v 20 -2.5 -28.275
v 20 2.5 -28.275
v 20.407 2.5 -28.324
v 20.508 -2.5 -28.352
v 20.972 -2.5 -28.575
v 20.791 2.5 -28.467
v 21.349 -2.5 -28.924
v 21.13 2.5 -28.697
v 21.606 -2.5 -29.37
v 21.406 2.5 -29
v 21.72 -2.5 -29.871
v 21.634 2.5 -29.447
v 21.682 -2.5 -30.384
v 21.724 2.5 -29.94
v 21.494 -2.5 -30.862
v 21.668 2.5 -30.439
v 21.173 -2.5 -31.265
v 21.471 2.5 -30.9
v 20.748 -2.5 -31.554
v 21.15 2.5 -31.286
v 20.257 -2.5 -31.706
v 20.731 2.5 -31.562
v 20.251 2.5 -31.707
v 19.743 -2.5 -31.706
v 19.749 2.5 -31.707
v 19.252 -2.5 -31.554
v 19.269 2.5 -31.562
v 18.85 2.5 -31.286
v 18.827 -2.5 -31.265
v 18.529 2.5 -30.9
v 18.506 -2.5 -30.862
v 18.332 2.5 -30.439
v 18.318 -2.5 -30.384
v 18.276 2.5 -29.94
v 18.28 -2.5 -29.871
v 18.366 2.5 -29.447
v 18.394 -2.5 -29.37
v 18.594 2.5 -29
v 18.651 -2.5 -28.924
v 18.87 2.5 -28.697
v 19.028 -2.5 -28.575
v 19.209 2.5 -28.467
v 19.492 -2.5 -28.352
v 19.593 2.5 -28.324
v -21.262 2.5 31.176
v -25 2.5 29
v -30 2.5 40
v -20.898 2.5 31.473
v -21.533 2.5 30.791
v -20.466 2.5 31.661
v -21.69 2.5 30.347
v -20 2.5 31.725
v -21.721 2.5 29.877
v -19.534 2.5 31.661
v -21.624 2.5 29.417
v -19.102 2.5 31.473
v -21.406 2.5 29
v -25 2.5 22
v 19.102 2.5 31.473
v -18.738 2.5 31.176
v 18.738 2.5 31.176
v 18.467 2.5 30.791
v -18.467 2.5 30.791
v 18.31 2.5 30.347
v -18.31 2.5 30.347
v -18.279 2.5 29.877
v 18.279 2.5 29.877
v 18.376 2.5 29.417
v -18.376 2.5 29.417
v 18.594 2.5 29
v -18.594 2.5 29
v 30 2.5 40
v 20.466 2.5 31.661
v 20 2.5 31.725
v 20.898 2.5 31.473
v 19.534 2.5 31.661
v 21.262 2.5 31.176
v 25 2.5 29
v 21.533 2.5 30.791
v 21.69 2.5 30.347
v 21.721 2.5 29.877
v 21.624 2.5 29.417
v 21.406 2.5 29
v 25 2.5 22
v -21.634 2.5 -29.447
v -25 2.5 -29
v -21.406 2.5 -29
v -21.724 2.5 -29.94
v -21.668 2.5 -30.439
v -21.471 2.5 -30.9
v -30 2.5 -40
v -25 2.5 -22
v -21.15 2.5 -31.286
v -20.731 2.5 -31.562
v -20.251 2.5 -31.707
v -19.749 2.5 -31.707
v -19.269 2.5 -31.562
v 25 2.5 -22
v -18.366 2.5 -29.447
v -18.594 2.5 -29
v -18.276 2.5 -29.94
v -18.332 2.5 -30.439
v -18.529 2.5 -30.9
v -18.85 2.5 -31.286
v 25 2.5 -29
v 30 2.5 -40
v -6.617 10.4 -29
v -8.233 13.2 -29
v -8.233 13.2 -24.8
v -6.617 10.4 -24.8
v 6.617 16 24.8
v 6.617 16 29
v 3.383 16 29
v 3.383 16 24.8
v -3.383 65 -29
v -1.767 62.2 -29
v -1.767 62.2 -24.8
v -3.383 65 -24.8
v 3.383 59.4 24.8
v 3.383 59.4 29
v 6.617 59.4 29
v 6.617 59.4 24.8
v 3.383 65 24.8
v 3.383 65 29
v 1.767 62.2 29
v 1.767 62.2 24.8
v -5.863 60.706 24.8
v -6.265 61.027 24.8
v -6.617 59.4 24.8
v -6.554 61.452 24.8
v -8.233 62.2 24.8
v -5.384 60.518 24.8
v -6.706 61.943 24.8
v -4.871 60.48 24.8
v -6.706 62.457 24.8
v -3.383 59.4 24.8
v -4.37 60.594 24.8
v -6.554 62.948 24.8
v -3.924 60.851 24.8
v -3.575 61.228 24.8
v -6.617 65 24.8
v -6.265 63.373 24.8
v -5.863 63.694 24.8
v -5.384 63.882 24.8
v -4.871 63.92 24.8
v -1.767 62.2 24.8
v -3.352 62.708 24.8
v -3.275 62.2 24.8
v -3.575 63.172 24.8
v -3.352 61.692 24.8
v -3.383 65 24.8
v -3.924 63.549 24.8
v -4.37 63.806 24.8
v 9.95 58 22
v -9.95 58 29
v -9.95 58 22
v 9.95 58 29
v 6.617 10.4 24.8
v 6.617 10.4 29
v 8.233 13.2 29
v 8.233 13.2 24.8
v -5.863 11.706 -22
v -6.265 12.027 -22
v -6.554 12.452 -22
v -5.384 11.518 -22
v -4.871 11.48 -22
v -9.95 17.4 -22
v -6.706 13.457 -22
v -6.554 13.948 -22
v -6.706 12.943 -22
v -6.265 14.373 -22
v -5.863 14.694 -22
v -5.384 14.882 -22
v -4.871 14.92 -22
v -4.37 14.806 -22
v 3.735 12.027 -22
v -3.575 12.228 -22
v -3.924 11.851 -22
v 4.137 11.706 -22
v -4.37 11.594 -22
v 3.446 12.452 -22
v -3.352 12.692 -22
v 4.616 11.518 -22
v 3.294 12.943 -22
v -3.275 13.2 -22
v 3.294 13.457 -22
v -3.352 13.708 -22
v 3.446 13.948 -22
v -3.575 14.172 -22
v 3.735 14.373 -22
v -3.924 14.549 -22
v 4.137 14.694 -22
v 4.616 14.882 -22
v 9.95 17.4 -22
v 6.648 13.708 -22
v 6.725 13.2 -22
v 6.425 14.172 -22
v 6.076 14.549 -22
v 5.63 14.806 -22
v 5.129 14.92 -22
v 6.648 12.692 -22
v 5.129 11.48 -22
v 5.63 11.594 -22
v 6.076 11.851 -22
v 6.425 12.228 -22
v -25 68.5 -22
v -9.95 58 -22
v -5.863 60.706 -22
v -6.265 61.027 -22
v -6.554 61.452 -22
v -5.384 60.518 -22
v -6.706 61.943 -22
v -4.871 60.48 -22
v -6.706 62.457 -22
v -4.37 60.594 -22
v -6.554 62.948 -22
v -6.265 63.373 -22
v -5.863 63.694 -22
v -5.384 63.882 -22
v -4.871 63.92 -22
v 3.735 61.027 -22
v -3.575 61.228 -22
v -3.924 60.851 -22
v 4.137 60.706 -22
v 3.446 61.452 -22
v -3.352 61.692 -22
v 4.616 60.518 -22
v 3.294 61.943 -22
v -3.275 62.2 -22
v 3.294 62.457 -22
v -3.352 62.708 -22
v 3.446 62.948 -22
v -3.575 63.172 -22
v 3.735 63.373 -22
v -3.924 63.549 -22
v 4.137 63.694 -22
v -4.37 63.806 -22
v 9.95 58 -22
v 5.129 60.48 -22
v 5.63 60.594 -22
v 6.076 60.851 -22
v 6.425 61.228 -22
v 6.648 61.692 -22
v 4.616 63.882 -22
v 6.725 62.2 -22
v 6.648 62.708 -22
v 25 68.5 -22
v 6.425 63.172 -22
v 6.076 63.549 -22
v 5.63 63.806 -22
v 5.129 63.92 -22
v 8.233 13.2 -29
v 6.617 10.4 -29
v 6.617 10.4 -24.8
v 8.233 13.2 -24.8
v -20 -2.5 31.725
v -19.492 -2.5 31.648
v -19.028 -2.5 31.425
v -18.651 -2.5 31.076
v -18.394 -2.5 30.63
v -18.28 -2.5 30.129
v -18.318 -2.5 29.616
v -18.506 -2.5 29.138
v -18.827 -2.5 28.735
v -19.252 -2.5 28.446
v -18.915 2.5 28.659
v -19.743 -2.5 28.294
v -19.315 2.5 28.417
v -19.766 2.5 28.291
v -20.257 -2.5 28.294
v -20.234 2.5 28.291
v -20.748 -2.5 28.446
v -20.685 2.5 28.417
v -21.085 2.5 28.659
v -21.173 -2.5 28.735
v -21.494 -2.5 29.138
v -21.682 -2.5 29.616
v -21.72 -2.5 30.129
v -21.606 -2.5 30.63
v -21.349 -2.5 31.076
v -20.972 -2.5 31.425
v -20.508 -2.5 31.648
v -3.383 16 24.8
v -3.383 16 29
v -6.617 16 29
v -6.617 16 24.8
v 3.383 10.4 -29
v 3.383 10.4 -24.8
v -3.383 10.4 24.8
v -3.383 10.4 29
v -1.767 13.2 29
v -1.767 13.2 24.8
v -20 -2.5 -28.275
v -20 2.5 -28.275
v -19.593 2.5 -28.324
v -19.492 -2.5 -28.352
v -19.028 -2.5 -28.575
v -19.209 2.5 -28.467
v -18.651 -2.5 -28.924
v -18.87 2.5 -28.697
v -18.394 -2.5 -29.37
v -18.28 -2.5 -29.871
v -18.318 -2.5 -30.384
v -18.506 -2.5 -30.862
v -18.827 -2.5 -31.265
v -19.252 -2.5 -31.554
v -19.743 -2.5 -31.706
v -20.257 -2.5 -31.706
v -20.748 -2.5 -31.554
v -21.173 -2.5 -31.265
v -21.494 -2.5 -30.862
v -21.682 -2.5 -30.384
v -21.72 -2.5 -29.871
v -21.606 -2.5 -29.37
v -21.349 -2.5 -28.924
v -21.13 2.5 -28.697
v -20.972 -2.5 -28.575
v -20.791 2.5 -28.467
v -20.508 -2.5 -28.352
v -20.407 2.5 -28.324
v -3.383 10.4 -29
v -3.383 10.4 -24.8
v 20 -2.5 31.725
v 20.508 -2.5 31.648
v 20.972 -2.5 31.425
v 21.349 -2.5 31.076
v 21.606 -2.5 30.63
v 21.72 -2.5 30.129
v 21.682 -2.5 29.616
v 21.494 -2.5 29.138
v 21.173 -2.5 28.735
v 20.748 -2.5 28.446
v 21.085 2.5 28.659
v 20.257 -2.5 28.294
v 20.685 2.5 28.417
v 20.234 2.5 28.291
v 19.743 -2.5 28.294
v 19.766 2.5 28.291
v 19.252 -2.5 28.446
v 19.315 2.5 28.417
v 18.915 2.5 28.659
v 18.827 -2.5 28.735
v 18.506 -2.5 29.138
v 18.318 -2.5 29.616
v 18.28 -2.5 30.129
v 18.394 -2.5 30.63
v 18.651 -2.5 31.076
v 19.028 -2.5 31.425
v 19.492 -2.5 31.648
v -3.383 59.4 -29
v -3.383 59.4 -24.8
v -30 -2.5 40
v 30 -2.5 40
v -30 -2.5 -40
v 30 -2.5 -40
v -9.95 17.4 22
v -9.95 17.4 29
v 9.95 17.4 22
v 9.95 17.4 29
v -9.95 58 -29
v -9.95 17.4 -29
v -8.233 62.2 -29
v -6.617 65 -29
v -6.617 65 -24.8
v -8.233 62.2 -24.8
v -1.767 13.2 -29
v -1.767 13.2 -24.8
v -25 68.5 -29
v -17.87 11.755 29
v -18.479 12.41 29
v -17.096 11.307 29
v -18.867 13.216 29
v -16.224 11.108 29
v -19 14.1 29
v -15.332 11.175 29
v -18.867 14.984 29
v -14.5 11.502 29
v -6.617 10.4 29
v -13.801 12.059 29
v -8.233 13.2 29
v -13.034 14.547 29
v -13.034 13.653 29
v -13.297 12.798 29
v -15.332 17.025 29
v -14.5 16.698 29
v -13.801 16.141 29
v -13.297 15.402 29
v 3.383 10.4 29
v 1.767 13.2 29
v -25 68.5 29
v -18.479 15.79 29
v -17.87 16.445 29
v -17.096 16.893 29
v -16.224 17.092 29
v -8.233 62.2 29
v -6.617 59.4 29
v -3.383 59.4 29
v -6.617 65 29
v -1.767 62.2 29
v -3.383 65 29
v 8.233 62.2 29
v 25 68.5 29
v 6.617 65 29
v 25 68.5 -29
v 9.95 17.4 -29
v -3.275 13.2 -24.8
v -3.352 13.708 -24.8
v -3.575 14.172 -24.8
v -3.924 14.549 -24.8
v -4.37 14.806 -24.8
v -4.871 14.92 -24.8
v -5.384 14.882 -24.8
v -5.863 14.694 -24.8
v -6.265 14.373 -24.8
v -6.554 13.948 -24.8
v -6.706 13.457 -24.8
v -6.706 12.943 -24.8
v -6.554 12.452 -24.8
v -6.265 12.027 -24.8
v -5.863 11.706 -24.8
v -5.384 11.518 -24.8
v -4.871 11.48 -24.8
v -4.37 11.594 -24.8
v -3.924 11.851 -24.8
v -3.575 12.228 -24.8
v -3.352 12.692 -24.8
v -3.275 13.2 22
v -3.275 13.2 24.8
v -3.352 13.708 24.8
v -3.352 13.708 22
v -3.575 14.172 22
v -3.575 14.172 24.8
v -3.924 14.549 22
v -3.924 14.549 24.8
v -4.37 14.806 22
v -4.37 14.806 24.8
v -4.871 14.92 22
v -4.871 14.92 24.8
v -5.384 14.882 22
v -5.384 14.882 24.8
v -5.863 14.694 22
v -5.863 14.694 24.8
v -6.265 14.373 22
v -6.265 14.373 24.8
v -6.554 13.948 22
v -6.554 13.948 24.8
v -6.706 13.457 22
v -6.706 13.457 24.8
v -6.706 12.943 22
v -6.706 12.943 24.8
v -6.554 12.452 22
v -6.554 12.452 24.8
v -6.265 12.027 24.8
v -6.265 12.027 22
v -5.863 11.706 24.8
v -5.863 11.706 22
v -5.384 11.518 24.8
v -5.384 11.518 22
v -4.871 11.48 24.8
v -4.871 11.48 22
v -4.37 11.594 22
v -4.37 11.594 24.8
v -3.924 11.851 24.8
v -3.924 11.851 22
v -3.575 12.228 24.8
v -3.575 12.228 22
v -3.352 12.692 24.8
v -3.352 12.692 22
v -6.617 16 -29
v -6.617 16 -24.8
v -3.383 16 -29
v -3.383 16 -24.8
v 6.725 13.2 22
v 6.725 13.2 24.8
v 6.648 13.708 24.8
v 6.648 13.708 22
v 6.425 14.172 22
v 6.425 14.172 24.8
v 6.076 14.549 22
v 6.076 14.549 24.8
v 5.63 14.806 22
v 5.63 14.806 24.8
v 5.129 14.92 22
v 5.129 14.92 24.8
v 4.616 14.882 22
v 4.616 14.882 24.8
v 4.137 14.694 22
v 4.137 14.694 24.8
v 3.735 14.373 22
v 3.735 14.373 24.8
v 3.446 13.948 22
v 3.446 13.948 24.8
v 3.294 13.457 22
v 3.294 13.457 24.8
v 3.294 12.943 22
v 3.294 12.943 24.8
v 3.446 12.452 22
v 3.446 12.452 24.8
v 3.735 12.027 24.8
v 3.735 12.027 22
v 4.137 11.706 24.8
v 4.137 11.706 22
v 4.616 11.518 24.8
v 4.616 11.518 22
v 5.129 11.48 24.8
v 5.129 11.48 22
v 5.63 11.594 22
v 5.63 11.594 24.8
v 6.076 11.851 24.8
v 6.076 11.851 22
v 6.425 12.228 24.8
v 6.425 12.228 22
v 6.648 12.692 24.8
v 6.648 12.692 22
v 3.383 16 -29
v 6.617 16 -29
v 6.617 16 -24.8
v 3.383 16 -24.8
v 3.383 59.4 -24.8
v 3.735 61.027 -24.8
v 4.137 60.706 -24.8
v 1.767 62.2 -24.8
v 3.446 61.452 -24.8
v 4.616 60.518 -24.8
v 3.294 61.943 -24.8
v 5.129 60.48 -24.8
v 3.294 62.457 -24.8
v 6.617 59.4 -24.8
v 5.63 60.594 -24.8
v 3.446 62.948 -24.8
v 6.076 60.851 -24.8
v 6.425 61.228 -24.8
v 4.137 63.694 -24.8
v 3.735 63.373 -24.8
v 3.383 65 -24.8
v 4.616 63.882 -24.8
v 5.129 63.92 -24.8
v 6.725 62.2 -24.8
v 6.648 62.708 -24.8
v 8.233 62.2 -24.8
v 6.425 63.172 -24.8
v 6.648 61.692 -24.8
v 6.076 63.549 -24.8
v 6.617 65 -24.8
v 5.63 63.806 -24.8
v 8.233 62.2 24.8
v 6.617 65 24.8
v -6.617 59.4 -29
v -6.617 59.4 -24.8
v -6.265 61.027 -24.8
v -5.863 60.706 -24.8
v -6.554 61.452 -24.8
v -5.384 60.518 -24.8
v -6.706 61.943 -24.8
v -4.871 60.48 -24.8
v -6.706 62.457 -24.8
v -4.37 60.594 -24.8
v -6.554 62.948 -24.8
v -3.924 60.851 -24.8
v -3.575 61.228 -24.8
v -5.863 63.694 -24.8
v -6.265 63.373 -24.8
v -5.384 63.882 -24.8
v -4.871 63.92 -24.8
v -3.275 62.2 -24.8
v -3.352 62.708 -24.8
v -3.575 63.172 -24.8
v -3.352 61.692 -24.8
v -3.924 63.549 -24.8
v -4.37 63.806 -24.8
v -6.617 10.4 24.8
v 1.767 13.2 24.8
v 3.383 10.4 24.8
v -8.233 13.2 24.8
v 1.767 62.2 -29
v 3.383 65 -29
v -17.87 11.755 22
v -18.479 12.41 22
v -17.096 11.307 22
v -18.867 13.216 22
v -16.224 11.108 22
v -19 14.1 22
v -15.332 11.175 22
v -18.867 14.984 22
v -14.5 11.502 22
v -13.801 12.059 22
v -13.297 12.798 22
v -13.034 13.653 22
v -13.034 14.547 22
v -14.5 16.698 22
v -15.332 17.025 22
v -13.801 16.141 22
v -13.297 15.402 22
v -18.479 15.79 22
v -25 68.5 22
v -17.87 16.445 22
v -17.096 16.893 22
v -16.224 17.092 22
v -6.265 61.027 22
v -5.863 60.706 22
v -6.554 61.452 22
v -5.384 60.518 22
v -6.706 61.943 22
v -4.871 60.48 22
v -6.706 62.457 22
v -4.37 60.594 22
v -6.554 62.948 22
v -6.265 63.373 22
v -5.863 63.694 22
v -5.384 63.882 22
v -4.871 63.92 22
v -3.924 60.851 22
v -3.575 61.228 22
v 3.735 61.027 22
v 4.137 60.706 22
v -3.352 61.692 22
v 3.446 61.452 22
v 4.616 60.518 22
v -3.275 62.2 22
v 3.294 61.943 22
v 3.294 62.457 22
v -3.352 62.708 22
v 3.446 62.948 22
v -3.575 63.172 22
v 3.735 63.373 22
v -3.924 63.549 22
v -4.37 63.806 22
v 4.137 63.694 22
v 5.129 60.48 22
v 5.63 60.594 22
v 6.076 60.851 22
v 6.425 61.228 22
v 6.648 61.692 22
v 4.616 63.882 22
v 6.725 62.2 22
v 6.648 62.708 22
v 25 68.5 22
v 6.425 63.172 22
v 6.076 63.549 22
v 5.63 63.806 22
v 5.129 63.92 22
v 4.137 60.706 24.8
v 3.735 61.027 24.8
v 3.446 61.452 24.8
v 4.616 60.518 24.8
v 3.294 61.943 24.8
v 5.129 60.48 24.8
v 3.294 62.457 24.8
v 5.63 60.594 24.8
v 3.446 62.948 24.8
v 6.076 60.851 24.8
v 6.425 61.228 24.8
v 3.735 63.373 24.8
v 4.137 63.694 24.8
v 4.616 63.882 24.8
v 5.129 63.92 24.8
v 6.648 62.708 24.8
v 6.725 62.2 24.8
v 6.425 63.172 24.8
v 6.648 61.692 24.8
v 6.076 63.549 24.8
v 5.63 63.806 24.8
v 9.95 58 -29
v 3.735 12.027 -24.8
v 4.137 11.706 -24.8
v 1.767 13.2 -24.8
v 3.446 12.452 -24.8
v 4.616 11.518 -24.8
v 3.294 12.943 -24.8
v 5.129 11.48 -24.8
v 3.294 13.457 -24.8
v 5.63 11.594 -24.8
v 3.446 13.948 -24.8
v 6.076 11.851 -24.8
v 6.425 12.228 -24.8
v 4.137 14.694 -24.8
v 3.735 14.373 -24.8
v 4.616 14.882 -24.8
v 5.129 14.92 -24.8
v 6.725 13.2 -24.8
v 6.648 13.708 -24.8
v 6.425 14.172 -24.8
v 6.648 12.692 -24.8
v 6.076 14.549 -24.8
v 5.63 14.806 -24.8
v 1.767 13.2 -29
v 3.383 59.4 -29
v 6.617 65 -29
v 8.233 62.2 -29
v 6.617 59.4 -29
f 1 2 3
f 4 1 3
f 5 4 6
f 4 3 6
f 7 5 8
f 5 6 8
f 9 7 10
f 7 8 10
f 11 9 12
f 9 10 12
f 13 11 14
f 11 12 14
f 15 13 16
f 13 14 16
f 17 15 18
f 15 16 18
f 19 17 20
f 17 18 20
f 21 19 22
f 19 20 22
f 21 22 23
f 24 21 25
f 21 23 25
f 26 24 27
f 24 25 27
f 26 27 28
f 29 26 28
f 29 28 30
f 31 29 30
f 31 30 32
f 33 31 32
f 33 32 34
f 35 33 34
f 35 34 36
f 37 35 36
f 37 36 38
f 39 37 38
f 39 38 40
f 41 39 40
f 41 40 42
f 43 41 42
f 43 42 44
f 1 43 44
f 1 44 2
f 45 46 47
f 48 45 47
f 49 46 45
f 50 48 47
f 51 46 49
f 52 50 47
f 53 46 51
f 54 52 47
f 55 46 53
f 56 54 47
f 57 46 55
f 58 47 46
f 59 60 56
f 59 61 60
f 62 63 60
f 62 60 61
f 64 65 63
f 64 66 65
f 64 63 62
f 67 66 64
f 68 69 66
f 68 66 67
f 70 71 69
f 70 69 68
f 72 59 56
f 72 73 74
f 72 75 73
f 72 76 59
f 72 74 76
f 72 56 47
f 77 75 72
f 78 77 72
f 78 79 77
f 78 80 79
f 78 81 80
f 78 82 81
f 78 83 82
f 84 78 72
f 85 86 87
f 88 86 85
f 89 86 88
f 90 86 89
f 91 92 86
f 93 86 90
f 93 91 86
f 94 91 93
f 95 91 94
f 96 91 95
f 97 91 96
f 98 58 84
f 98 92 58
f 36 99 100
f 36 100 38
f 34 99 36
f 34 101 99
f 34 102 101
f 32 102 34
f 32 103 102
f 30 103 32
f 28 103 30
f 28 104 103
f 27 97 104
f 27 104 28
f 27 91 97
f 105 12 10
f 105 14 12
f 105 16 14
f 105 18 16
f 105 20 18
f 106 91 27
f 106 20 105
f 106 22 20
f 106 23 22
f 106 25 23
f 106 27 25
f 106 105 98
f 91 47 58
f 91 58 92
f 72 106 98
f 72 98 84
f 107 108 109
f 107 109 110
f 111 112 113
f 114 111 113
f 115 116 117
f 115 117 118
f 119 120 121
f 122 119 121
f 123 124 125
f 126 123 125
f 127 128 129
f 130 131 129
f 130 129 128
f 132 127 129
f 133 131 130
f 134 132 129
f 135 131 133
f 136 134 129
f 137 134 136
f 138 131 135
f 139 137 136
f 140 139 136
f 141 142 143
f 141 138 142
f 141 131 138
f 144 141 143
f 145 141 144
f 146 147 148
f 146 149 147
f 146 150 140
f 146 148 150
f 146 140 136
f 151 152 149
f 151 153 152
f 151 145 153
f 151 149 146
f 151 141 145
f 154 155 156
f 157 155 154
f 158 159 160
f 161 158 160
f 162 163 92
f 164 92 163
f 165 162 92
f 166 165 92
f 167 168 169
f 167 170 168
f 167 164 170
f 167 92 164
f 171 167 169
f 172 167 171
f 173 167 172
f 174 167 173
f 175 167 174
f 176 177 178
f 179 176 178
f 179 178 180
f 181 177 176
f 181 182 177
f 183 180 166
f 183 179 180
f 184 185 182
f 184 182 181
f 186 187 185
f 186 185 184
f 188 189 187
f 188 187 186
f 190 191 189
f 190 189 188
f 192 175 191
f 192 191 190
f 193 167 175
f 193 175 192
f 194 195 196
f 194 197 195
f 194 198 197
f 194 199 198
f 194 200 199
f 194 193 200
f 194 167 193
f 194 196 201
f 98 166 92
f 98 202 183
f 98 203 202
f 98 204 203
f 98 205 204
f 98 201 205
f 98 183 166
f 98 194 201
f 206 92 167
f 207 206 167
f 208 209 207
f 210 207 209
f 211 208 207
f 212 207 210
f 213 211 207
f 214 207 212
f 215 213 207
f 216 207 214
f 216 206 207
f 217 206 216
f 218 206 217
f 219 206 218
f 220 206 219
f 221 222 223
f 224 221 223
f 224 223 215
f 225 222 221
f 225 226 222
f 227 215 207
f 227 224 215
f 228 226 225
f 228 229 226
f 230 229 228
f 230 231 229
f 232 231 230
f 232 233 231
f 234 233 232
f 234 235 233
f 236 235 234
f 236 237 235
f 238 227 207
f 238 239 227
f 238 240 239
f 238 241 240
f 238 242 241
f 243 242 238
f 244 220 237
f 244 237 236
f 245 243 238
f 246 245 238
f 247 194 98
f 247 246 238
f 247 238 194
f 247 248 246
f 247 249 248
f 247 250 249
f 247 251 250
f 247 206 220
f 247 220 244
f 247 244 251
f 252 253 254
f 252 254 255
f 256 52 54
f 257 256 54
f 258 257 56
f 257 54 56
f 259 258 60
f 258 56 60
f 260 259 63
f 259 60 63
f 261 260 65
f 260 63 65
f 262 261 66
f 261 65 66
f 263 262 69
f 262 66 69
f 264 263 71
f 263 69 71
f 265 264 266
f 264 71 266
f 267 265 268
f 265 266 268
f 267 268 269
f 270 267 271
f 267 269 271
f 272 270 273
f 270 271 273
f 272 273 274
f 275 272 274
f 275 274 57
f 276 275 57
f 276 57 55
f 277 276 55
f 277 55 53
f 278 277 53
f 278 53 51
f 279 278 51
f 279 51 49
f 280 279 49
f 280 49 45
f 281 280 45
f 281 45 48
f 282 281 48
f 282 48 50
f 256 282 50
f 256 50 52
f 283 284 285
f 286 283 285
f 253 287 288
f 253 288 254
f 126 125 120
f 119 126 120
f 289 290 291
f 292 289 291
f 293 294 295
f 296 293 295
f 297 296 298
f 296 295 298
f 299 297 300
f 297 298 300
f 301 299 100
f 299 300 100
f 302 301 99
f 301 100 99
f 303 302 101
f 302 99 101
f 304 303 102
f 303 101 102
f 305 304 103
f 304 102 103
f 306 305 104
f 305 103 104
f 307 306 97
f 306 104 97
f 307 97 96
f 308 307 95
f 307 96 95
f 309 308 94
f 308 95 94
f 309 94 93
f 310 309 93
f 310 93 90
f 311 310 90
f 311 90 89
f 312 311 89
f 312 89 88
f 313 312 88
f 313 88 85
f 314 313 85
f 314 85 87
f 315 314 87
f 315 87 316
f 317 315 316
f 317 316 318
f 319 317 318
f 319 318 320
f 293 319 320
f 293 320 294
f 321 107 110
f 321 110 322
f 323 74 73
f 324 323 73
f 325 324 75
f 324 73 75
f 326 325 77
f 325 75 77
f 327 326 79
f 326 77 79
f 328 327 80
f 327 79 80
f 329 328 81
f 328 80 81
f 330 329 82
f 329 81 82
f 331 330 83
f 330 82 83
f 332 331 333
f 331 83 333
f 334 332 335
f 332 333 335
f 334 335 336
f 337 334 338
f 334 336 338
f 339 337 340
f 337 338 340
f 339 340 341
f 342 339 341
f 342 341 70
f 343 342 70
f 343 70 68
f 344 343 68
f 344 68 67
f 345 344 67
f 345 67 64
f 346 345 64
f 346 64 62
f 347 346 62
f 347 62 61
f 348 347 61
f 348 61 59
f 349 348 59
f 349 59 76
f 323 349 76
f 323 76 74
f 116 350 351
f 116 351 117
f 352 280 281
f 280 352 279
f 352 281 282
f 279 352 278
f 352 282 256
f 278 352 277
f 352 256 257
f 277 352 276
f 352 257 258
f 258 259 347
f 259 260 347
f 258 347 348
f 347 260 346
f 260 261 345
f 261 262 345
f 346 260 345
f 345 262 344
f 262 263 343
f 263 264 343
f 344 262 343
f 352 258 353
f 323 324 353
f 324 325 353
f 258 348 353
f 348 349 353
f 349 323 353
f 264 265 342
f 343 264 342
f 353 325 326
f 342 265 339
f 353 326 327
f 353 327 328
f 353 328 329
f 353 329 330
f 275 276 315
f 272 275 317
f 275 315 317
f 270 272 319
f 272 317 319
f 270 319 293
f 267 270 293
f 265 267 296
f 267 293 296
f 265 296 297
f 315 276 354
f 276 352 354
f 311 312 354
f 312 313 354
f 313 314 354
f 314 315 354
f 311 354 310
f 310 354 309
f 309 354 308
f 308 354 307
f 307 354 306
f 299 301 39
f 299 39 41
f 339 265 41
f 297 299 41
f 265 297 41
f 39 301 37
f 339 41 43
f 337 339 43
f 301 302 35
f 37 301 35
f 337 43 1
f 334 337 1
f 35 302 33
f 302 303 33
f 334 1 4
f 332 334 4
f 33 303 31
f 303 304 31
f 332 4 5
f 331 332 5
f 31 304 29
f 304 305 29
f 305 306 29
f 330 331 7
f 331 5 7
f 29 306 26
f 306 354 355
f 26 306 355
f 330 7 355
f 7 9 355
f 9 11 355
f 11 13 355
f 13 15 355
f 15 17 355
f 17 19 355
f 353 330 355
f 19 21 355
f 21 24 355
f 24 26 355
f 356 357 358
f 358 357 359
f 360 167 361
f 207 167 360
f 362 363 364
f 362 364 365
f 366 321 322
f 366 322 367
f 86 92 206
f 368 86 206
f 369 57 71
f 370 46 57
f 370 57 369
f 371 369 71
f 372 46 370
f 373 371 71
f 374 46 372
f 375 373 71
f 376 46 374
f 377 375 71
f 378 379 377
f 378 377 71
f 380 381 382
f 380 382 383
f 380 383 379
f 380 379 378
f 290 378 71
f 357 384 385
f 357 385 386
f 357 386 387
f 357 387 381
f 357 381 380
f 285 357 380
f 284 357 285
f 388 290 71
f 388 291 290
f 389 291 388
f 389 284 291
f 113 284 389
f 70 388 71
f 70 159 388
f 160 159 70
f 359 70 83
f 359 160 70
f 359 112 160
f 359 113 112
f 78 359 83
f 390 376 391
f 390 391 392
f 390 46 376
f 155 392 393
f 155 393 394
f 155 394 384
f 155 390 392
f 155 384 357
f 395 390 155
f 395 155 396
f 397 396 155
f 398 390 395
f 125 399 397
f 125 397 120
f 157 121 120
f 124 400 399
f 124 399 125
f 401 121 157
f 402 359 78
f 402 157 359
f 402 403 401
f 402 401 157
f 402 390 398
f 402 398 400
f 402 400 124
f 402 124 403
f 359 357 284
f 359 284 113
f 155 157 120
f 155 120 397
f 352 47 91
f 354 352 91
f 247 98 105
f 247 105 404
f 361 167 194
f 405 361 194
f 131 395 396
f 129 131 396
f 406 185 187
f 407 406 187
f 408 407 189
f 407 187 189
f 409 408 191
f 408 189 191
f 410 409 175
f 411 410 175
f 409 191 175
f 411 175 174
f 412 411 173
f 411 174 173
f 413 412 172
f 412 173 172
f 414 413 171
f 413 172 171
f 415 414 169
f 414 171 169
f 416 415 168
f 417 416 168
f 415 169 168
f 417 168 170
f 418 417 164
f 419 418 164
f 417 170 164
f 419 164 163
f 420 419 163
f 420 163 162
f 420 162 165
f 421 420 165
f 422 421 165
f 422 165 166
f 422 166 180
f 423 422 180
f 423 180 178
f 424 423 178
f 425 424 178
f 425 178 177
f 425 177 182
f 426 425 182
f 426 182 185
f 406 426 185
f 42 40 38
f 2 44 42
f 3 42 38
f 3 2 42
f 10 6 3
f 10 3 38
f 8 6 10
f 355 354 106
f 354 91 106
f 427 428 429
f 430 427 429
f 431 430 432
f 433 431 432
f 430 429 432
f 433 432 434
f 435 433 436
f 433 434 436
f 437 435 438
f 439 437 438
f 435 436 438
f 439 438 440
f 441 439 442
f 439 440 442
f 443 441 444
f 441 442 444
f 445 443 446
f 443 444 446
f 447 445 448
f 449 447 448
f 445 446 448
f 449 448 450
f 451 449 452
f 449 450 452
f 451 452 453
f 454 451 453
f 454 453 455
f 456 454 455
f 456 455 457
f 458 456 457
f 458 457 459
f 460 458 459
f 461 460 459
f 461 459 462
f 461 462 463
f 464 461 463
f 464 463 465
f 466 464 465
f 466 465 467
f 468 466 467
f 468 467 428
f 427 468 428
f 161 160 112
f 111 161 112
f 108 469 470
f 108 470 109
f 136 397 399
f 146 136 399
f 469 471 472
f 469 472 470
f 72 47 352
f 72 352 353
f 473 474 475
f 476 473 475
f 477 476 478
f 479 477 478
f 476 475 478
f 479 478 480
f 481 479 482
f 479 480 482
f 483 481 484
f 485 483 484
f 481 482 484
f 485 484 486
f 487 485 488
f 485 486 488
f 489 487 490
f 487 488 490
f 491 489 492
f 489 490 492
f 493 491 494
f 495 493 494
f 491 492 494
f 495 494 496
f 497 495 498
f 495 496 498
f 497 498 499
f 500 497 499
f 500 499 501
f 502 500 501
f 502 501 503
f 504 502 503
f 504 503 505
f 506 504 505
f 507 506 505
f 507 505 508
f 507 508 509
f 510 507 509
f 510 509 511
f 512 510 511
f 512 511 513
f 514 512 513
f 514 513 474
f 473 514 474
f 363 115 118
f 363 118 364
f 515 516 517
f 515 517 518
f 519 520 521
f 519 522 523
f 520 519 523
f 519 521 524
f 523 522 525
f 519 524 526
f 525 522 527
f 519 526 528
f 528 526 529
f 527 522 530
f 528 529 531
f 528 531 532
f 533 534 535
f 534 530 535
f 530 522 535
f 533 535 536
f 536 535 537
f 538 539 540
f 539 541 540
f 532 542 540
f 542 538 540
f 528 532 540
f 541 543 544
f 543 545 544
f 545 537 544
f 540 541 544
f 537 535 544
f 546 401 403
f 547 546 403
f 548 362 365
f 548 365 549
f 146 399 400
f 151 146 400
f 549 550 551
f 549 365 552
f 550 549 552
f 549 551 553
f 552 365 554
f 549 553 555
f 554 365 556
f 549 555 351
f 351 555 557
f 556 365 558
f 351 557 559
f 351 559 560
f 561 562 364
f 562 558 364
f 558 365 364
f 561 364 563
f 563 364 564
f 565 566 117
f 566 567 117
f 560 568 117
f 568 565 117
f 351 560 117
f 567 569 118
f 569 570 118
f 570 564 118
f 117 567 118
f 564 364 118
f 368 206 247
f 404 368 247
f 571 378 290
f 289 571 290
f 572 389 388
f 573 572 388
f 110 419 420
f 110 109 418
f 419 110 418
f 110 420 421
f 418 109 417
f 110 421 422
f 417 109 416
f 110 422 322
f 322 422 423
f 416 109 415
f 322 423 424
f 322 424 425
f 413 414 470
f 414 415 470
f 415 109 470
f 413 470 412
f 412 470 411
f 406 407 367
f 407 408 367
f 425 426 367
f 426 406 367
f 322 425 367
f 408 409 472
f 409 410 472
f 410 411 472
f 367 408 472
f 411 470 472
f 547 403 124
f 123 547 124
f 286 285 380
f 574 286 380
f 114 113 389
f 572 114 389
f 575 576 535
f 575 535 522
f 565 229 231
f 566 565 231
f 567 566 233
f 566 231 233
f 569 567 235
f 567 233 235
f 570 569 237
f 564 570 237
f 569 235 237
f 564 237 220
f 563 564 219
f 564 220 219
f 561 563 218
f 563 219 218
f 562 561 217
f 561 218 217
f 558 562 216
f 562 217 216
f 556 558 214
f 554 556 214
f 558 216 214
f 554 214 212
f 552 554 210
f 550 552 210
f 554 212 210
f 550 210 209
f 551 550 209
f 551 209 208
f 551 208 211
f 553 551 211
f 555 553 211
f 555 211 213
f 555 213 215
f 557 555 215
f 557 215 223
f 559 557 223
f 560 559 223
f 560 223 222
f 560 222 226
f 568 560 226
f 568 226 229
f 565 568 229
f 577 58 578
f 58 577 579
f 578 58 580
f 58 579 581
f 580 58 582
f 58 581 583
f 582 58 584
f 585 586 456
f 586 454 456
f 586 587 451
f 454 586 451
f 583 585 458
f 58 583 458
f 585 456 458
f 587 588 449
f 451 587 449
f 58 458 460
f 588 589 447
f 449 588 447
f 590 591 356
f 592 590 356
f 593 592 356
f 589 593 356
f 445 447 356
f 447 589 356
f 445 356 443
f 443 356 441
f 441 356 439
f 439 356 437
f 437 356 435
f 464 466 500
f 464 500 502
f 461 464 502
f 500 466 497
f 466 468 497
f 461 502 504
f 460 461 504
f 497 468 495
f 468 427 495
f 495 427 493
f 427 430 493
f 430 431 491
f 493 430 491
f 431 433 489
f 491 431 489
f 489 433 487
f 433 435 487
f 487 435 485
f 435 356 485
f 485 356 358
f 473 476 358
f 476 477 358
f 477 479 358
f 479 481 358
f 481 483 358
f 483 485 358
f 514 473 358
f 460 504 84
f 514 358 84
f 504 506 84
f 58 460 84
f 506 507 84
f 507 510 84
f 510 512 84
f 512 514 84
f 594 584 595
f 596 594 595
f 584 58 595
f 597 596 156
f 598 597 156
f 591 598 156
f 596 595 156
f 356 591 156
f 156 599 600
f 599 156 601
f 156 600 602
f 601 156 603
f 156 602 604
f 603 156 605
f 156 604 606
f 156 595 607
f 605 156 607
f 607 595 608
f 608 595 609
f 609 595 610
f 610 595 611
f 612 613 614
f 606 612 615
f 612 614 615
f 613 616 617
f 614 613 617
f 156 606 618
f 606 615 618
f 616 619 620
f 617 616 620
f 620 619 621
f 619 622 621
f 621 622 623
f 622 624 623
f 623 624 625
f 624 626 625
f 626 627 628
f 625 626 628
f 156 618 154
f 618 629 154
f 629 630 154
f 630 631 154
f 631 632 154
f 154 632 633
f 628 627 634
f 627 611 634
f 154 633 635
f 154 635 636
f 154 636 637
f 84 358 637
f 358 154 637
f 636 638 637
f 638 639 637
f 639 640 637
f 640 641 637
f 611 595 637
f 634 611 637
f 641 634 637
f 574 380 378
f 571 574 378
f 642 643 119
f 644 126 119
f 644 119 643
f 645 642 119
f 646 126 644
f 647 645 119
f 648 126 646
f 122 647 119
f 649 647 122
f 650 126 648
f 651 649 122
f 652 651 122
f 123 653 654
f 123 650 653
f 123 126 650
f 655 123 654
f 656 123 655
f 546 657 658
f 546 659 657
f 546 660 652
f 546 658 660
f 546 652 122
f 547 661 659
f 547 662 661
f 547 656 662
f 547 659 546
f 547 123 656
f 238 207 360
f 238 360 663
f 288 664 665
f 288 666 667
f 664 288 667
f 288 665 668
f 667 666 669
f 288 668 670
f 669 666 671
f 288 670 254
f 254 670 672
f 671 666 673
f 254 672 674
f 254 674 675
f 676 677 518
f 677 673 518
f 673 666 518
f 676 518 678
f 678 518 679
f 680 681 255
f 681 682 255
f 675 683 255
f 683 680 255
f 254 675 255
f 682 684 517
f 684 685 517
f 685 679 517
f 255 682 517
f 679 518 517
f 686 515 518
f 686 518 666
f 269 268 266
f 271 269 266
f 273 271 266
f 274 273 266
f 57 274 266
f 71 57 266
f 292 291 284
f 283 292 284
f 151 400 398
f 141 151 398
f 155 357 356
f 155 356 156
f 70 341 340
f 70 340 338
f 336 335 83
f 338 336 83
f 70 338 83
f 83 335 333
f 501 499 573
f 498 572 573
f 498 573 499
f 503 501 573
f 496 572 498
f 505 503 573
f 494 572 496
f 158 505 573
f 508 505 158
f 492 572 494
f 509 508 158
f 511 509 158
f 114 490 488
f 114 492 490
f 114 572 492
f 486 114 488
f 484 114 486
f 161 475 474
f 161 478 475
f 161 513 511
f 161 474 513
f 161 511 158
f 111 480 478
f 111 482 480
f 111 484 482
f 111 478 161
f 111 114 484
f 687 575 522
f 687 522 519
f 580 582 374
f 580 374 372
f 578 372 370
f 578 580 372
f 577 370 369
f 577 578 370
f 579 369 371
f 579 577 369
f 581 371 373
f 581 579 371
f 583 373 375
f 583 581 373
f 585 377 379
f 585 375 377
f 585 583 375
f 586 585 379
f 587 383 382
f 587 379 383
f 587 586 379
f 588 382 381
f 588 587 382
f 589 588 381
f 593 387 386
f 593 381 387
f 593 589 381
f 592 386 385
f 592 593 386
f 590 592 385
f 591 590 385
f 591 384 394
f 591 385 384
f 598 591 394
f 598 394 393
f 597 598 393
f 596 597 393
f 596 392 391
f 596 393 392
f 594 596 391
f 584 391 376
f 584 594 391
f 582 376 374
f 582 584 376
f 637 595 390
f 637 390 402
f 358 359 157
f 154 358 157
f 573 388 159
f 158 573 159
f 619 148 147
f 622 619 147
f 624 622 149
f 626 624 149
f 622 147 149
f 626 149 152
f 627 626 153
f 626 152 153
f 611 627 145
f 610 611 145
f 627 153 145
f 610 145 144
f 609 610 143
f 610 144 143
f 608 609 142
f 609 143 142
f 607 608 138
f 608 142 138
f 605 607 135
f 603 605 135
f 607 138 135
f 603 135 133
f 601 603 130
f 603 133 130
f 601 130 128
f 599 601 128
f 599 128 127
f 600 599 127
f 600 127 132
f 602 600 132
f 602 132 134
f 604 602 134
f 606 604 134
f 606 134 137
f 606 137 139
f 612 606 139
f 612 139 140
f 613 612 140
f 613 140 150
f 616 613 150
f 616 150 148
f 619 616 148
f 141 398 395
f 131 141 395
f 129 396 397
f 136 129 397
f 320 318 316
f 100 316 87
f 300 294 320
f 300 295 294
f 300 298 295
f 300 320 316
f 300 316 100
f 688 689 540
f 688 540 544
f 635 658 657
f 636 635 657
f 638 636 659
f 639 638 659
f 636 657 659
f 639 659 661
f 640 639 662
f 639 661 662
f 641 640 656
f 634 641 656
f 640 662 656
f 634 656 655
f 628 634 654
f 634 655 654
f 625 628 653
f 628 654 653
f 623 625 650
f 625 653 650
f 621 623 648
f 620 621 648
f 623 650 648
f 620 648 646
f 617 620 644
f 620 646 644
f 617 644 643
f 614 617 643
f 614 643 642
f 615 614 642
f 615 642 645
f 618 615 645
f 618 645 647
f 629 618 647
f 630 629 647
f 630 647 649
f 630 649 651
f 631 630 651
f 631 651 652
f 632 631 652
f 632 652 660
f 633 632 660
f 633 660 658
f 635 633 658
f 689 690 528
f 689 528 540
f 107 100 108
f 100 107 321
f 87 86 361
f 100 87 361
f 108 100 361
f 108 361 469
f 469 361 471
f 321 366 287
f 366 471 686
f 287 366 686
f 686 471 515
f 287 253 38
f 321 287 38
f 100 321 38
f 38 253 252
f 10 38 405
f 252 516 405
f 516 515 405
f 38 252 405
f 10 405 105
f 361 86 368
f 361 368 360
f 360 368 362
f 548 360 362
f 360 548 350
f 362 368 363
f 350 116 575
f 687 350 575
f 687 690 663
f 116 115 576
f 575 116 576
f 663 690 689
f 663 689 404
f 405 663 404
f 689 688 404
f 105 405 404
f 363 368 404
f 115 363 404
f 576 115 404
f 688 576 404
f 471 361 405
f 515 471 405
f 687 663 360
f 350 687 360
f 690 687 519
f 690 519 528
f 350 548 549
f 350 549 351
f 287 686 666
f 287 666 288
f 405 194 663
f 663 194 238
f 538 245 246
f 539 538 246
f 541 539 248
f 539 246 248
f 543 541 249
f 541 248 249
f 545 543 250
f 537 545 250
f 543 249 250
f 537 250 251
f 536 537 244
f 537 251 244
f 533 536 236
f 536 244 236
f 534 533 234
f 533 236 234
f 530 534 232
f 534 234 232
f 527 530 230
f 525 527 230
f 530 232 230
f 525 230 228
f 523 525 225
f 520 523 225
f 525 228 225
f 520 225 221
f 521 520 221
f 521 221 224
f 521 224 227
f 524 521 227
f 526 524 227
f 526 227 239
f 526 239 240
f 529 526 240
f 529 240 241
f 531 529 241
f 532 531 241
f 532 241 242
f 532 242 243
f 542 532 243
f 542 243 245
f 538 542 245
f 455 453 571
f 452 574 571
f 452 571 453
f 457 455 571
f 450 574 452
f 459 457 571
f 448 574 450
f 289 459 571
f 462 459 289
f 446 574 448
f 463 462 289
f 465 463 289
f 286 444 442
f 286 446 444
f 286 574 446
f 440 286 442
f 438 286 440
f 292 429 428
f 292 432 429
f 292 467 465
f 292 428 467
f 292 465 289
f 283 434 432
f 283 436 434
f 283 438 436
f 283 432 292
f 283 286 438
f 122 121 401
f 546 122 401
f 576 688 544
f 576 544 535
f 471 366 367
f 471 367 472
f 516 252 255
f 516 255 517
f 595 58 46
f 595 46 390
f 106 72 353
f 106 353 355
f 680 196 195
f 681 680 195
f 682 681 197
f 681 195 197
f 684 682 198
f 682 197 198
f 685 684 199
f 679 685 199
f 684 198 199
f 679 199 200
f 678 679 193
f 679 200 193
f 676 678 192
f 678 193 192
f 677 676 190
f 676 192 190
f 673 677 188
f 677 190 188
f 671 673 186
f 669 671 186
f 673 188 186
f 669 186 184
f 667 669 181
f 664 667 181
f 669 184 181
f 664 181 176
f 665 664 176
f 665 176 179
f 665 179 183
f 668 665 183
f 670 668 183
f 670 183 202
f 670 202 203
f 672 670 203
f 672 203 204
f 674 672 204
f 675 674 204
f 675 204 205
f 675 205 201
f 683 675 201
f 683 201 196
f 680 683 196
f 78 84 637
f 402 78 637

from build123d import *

# Parameters (mm, degrees)
SKETCH1_W           = 60
SKETCH1_H           = 80
BOSS_EXTRUDE1_DEPTH = 2.5
SKETCH2_R           = 1.725
CUT_EXTRUDE1_DEPTH  = 51.249378106
SKETCH3_W           = 50
SKETCH3_H           = 66
BOSS_EXTRUDE2_DEPTH = 7
SKETCH4_W           = 19.9
SKETCH4_H           = 40.6
CUT_EXTRUDE2_DEPTH  = 102.750921372
SKETCH5_R           = 1.725
CUT_EXTRUDE3_DEPTH  = 102.750921372
CUT_EXTRUDE4_DEPTH  = 4.2
CUT_EXTRUDE5_START  = 21
SKETCH7_R           = 3
CUT_EXTRUDE5_DEPTH  = 9


with BuildPart() as part:
    # Sketch1 → Boss-Extrude1 (new, symmetric)
    with BuildSketch(Plane(origin=(0, 0, 0), x_dir=(1, 0, 0), z_dir=(0, 1, 0))):
        Rectangle(SKETCH1_W, SKETCH1_H)
    extrude(amount=BOSS_EXTRUDE1_DEPTH, both=True)

    # Sketch2 → Cut-Extrude1 (cut, through all)
    with BuildSketch(Plane(origin=(0, 2.5, 0), x_dir=(1, 0, 0), z_dir=(0, 1, 0))):
        with Locations(Location((-20, 30, 0), (0, 0, 270))):
            Circle(SKETCH2_R)
        with Locations(Location((20, 30, 0), (0, 0, 270))):
            Circle(SKETCH2_R)
        with Locations(Location((20, -30, 0), (0, 0, 270))):
            Circle(SKETCH2_R)
        with Locations(Location((-20, -30, 0), (0, 0, 270))):
            Circle(SKETCH2_R)
    extrude(amount=-CUT_EXTRUDE1_DEPTH, mode=Mode.SUBTRACT)

    # Sketch3 → Boss-Extrude2 (add)
    with BuildSketch(Plane.XY.offset(22)):
        with Locations((0, 35.5)):
            Rectangle(SKETCH3_W, SKETCH3_H)
    boss_extrude2 = extrude(amount=BOSS_EXTRUDE2_DEPTH)

    # Mirror1: Boss-Extrude2 across plane
    add(boss_extrude2.mirror(Plane.XY))

    # Sketch4 → Cut-Extrude2 (cut, through all)
    with BuildSketch(Plane.XY.offset(29)):
        with Locations((0, 37.7)):
            Rectangle(SKETCH4_W, SKETCH4_H)
    extrude(amount=-CUT_EXTRUDE2_DEPTH, mode=Mode.SUBTRACT)

    # Sketch5 → Cut-Extrude3 (cut, through all)
    with BuildSketch(Plane.XY.offset(29)):
        with Locations((-5, 62.2)):
            Circle(SKETCH5_R)
        with Locations((5, 62.2)):
            Circle(SKETCH5_R)
        with Locations((-5, 13.2)):
            Circle(SKETCH5_R)
        with Locations((5, 13.2)):
            Circle(SKETCH5_R)
    extrude(amount=-CUT_EXTRUDE3_DEPTH, mode=Mode.SUBTRACT)

    # Sketch6 → Cut-Extrude4 (cut)
    with BuildSketch(Plane.XY.offset(29)):
        Polygon((-1.766838493, 62.2), (-3.383419246, 65), (-6.616580754, 65), (-8.233161507, 62.2), (-6.616580754, 59.4), (-3.383419246, 59.4), align=None)
        Polygon((1.766838493, 62.2), (3.383419246, 59.4), (6.616580754, 59.4), (8.233161507, 62.2), (6.616580754, 65), (3.383419246, 65), align=None)
        Polygon((-1.766838493, 13.2), (-3.383419246, 16), (-6.616580754, 16), (-8.233161507, 13.2), (-6.616580754, 10.4), (-3.383419246, 10.4), align=None)
        Polygon((8.233161507, 13.2), (6.616580754, 16), (3.383419246, 16), (1.766838493, 13.2), (3.383419246, 10.4), (6.616580754, 10.4), align=None)
    cut_extrude4 = extrude(amount=-CUT_EXTRUDE4_DEPTH, mode=Mode.SUBTRACT)

    # Mirror3: Cut-Extrude4 across plane
    add(cut_extrude4.mirror(Plane.XY), mode=Mode.SUBTRACT)

    # Sketch7 → Cut-Extrude5 (cut)
    with BuildSketch(Plane.XY.offset(CUT_EXTRUDE5_START)):
        with Locations(Location((-16, 14.1, 0), (0, 0, 180))):
            Circle(SKETCH7_R)
    extrude(amount=CUT_EXTRUDE5_DEPTH, mode=Mode.SUBTRACT)


solid = part.part
